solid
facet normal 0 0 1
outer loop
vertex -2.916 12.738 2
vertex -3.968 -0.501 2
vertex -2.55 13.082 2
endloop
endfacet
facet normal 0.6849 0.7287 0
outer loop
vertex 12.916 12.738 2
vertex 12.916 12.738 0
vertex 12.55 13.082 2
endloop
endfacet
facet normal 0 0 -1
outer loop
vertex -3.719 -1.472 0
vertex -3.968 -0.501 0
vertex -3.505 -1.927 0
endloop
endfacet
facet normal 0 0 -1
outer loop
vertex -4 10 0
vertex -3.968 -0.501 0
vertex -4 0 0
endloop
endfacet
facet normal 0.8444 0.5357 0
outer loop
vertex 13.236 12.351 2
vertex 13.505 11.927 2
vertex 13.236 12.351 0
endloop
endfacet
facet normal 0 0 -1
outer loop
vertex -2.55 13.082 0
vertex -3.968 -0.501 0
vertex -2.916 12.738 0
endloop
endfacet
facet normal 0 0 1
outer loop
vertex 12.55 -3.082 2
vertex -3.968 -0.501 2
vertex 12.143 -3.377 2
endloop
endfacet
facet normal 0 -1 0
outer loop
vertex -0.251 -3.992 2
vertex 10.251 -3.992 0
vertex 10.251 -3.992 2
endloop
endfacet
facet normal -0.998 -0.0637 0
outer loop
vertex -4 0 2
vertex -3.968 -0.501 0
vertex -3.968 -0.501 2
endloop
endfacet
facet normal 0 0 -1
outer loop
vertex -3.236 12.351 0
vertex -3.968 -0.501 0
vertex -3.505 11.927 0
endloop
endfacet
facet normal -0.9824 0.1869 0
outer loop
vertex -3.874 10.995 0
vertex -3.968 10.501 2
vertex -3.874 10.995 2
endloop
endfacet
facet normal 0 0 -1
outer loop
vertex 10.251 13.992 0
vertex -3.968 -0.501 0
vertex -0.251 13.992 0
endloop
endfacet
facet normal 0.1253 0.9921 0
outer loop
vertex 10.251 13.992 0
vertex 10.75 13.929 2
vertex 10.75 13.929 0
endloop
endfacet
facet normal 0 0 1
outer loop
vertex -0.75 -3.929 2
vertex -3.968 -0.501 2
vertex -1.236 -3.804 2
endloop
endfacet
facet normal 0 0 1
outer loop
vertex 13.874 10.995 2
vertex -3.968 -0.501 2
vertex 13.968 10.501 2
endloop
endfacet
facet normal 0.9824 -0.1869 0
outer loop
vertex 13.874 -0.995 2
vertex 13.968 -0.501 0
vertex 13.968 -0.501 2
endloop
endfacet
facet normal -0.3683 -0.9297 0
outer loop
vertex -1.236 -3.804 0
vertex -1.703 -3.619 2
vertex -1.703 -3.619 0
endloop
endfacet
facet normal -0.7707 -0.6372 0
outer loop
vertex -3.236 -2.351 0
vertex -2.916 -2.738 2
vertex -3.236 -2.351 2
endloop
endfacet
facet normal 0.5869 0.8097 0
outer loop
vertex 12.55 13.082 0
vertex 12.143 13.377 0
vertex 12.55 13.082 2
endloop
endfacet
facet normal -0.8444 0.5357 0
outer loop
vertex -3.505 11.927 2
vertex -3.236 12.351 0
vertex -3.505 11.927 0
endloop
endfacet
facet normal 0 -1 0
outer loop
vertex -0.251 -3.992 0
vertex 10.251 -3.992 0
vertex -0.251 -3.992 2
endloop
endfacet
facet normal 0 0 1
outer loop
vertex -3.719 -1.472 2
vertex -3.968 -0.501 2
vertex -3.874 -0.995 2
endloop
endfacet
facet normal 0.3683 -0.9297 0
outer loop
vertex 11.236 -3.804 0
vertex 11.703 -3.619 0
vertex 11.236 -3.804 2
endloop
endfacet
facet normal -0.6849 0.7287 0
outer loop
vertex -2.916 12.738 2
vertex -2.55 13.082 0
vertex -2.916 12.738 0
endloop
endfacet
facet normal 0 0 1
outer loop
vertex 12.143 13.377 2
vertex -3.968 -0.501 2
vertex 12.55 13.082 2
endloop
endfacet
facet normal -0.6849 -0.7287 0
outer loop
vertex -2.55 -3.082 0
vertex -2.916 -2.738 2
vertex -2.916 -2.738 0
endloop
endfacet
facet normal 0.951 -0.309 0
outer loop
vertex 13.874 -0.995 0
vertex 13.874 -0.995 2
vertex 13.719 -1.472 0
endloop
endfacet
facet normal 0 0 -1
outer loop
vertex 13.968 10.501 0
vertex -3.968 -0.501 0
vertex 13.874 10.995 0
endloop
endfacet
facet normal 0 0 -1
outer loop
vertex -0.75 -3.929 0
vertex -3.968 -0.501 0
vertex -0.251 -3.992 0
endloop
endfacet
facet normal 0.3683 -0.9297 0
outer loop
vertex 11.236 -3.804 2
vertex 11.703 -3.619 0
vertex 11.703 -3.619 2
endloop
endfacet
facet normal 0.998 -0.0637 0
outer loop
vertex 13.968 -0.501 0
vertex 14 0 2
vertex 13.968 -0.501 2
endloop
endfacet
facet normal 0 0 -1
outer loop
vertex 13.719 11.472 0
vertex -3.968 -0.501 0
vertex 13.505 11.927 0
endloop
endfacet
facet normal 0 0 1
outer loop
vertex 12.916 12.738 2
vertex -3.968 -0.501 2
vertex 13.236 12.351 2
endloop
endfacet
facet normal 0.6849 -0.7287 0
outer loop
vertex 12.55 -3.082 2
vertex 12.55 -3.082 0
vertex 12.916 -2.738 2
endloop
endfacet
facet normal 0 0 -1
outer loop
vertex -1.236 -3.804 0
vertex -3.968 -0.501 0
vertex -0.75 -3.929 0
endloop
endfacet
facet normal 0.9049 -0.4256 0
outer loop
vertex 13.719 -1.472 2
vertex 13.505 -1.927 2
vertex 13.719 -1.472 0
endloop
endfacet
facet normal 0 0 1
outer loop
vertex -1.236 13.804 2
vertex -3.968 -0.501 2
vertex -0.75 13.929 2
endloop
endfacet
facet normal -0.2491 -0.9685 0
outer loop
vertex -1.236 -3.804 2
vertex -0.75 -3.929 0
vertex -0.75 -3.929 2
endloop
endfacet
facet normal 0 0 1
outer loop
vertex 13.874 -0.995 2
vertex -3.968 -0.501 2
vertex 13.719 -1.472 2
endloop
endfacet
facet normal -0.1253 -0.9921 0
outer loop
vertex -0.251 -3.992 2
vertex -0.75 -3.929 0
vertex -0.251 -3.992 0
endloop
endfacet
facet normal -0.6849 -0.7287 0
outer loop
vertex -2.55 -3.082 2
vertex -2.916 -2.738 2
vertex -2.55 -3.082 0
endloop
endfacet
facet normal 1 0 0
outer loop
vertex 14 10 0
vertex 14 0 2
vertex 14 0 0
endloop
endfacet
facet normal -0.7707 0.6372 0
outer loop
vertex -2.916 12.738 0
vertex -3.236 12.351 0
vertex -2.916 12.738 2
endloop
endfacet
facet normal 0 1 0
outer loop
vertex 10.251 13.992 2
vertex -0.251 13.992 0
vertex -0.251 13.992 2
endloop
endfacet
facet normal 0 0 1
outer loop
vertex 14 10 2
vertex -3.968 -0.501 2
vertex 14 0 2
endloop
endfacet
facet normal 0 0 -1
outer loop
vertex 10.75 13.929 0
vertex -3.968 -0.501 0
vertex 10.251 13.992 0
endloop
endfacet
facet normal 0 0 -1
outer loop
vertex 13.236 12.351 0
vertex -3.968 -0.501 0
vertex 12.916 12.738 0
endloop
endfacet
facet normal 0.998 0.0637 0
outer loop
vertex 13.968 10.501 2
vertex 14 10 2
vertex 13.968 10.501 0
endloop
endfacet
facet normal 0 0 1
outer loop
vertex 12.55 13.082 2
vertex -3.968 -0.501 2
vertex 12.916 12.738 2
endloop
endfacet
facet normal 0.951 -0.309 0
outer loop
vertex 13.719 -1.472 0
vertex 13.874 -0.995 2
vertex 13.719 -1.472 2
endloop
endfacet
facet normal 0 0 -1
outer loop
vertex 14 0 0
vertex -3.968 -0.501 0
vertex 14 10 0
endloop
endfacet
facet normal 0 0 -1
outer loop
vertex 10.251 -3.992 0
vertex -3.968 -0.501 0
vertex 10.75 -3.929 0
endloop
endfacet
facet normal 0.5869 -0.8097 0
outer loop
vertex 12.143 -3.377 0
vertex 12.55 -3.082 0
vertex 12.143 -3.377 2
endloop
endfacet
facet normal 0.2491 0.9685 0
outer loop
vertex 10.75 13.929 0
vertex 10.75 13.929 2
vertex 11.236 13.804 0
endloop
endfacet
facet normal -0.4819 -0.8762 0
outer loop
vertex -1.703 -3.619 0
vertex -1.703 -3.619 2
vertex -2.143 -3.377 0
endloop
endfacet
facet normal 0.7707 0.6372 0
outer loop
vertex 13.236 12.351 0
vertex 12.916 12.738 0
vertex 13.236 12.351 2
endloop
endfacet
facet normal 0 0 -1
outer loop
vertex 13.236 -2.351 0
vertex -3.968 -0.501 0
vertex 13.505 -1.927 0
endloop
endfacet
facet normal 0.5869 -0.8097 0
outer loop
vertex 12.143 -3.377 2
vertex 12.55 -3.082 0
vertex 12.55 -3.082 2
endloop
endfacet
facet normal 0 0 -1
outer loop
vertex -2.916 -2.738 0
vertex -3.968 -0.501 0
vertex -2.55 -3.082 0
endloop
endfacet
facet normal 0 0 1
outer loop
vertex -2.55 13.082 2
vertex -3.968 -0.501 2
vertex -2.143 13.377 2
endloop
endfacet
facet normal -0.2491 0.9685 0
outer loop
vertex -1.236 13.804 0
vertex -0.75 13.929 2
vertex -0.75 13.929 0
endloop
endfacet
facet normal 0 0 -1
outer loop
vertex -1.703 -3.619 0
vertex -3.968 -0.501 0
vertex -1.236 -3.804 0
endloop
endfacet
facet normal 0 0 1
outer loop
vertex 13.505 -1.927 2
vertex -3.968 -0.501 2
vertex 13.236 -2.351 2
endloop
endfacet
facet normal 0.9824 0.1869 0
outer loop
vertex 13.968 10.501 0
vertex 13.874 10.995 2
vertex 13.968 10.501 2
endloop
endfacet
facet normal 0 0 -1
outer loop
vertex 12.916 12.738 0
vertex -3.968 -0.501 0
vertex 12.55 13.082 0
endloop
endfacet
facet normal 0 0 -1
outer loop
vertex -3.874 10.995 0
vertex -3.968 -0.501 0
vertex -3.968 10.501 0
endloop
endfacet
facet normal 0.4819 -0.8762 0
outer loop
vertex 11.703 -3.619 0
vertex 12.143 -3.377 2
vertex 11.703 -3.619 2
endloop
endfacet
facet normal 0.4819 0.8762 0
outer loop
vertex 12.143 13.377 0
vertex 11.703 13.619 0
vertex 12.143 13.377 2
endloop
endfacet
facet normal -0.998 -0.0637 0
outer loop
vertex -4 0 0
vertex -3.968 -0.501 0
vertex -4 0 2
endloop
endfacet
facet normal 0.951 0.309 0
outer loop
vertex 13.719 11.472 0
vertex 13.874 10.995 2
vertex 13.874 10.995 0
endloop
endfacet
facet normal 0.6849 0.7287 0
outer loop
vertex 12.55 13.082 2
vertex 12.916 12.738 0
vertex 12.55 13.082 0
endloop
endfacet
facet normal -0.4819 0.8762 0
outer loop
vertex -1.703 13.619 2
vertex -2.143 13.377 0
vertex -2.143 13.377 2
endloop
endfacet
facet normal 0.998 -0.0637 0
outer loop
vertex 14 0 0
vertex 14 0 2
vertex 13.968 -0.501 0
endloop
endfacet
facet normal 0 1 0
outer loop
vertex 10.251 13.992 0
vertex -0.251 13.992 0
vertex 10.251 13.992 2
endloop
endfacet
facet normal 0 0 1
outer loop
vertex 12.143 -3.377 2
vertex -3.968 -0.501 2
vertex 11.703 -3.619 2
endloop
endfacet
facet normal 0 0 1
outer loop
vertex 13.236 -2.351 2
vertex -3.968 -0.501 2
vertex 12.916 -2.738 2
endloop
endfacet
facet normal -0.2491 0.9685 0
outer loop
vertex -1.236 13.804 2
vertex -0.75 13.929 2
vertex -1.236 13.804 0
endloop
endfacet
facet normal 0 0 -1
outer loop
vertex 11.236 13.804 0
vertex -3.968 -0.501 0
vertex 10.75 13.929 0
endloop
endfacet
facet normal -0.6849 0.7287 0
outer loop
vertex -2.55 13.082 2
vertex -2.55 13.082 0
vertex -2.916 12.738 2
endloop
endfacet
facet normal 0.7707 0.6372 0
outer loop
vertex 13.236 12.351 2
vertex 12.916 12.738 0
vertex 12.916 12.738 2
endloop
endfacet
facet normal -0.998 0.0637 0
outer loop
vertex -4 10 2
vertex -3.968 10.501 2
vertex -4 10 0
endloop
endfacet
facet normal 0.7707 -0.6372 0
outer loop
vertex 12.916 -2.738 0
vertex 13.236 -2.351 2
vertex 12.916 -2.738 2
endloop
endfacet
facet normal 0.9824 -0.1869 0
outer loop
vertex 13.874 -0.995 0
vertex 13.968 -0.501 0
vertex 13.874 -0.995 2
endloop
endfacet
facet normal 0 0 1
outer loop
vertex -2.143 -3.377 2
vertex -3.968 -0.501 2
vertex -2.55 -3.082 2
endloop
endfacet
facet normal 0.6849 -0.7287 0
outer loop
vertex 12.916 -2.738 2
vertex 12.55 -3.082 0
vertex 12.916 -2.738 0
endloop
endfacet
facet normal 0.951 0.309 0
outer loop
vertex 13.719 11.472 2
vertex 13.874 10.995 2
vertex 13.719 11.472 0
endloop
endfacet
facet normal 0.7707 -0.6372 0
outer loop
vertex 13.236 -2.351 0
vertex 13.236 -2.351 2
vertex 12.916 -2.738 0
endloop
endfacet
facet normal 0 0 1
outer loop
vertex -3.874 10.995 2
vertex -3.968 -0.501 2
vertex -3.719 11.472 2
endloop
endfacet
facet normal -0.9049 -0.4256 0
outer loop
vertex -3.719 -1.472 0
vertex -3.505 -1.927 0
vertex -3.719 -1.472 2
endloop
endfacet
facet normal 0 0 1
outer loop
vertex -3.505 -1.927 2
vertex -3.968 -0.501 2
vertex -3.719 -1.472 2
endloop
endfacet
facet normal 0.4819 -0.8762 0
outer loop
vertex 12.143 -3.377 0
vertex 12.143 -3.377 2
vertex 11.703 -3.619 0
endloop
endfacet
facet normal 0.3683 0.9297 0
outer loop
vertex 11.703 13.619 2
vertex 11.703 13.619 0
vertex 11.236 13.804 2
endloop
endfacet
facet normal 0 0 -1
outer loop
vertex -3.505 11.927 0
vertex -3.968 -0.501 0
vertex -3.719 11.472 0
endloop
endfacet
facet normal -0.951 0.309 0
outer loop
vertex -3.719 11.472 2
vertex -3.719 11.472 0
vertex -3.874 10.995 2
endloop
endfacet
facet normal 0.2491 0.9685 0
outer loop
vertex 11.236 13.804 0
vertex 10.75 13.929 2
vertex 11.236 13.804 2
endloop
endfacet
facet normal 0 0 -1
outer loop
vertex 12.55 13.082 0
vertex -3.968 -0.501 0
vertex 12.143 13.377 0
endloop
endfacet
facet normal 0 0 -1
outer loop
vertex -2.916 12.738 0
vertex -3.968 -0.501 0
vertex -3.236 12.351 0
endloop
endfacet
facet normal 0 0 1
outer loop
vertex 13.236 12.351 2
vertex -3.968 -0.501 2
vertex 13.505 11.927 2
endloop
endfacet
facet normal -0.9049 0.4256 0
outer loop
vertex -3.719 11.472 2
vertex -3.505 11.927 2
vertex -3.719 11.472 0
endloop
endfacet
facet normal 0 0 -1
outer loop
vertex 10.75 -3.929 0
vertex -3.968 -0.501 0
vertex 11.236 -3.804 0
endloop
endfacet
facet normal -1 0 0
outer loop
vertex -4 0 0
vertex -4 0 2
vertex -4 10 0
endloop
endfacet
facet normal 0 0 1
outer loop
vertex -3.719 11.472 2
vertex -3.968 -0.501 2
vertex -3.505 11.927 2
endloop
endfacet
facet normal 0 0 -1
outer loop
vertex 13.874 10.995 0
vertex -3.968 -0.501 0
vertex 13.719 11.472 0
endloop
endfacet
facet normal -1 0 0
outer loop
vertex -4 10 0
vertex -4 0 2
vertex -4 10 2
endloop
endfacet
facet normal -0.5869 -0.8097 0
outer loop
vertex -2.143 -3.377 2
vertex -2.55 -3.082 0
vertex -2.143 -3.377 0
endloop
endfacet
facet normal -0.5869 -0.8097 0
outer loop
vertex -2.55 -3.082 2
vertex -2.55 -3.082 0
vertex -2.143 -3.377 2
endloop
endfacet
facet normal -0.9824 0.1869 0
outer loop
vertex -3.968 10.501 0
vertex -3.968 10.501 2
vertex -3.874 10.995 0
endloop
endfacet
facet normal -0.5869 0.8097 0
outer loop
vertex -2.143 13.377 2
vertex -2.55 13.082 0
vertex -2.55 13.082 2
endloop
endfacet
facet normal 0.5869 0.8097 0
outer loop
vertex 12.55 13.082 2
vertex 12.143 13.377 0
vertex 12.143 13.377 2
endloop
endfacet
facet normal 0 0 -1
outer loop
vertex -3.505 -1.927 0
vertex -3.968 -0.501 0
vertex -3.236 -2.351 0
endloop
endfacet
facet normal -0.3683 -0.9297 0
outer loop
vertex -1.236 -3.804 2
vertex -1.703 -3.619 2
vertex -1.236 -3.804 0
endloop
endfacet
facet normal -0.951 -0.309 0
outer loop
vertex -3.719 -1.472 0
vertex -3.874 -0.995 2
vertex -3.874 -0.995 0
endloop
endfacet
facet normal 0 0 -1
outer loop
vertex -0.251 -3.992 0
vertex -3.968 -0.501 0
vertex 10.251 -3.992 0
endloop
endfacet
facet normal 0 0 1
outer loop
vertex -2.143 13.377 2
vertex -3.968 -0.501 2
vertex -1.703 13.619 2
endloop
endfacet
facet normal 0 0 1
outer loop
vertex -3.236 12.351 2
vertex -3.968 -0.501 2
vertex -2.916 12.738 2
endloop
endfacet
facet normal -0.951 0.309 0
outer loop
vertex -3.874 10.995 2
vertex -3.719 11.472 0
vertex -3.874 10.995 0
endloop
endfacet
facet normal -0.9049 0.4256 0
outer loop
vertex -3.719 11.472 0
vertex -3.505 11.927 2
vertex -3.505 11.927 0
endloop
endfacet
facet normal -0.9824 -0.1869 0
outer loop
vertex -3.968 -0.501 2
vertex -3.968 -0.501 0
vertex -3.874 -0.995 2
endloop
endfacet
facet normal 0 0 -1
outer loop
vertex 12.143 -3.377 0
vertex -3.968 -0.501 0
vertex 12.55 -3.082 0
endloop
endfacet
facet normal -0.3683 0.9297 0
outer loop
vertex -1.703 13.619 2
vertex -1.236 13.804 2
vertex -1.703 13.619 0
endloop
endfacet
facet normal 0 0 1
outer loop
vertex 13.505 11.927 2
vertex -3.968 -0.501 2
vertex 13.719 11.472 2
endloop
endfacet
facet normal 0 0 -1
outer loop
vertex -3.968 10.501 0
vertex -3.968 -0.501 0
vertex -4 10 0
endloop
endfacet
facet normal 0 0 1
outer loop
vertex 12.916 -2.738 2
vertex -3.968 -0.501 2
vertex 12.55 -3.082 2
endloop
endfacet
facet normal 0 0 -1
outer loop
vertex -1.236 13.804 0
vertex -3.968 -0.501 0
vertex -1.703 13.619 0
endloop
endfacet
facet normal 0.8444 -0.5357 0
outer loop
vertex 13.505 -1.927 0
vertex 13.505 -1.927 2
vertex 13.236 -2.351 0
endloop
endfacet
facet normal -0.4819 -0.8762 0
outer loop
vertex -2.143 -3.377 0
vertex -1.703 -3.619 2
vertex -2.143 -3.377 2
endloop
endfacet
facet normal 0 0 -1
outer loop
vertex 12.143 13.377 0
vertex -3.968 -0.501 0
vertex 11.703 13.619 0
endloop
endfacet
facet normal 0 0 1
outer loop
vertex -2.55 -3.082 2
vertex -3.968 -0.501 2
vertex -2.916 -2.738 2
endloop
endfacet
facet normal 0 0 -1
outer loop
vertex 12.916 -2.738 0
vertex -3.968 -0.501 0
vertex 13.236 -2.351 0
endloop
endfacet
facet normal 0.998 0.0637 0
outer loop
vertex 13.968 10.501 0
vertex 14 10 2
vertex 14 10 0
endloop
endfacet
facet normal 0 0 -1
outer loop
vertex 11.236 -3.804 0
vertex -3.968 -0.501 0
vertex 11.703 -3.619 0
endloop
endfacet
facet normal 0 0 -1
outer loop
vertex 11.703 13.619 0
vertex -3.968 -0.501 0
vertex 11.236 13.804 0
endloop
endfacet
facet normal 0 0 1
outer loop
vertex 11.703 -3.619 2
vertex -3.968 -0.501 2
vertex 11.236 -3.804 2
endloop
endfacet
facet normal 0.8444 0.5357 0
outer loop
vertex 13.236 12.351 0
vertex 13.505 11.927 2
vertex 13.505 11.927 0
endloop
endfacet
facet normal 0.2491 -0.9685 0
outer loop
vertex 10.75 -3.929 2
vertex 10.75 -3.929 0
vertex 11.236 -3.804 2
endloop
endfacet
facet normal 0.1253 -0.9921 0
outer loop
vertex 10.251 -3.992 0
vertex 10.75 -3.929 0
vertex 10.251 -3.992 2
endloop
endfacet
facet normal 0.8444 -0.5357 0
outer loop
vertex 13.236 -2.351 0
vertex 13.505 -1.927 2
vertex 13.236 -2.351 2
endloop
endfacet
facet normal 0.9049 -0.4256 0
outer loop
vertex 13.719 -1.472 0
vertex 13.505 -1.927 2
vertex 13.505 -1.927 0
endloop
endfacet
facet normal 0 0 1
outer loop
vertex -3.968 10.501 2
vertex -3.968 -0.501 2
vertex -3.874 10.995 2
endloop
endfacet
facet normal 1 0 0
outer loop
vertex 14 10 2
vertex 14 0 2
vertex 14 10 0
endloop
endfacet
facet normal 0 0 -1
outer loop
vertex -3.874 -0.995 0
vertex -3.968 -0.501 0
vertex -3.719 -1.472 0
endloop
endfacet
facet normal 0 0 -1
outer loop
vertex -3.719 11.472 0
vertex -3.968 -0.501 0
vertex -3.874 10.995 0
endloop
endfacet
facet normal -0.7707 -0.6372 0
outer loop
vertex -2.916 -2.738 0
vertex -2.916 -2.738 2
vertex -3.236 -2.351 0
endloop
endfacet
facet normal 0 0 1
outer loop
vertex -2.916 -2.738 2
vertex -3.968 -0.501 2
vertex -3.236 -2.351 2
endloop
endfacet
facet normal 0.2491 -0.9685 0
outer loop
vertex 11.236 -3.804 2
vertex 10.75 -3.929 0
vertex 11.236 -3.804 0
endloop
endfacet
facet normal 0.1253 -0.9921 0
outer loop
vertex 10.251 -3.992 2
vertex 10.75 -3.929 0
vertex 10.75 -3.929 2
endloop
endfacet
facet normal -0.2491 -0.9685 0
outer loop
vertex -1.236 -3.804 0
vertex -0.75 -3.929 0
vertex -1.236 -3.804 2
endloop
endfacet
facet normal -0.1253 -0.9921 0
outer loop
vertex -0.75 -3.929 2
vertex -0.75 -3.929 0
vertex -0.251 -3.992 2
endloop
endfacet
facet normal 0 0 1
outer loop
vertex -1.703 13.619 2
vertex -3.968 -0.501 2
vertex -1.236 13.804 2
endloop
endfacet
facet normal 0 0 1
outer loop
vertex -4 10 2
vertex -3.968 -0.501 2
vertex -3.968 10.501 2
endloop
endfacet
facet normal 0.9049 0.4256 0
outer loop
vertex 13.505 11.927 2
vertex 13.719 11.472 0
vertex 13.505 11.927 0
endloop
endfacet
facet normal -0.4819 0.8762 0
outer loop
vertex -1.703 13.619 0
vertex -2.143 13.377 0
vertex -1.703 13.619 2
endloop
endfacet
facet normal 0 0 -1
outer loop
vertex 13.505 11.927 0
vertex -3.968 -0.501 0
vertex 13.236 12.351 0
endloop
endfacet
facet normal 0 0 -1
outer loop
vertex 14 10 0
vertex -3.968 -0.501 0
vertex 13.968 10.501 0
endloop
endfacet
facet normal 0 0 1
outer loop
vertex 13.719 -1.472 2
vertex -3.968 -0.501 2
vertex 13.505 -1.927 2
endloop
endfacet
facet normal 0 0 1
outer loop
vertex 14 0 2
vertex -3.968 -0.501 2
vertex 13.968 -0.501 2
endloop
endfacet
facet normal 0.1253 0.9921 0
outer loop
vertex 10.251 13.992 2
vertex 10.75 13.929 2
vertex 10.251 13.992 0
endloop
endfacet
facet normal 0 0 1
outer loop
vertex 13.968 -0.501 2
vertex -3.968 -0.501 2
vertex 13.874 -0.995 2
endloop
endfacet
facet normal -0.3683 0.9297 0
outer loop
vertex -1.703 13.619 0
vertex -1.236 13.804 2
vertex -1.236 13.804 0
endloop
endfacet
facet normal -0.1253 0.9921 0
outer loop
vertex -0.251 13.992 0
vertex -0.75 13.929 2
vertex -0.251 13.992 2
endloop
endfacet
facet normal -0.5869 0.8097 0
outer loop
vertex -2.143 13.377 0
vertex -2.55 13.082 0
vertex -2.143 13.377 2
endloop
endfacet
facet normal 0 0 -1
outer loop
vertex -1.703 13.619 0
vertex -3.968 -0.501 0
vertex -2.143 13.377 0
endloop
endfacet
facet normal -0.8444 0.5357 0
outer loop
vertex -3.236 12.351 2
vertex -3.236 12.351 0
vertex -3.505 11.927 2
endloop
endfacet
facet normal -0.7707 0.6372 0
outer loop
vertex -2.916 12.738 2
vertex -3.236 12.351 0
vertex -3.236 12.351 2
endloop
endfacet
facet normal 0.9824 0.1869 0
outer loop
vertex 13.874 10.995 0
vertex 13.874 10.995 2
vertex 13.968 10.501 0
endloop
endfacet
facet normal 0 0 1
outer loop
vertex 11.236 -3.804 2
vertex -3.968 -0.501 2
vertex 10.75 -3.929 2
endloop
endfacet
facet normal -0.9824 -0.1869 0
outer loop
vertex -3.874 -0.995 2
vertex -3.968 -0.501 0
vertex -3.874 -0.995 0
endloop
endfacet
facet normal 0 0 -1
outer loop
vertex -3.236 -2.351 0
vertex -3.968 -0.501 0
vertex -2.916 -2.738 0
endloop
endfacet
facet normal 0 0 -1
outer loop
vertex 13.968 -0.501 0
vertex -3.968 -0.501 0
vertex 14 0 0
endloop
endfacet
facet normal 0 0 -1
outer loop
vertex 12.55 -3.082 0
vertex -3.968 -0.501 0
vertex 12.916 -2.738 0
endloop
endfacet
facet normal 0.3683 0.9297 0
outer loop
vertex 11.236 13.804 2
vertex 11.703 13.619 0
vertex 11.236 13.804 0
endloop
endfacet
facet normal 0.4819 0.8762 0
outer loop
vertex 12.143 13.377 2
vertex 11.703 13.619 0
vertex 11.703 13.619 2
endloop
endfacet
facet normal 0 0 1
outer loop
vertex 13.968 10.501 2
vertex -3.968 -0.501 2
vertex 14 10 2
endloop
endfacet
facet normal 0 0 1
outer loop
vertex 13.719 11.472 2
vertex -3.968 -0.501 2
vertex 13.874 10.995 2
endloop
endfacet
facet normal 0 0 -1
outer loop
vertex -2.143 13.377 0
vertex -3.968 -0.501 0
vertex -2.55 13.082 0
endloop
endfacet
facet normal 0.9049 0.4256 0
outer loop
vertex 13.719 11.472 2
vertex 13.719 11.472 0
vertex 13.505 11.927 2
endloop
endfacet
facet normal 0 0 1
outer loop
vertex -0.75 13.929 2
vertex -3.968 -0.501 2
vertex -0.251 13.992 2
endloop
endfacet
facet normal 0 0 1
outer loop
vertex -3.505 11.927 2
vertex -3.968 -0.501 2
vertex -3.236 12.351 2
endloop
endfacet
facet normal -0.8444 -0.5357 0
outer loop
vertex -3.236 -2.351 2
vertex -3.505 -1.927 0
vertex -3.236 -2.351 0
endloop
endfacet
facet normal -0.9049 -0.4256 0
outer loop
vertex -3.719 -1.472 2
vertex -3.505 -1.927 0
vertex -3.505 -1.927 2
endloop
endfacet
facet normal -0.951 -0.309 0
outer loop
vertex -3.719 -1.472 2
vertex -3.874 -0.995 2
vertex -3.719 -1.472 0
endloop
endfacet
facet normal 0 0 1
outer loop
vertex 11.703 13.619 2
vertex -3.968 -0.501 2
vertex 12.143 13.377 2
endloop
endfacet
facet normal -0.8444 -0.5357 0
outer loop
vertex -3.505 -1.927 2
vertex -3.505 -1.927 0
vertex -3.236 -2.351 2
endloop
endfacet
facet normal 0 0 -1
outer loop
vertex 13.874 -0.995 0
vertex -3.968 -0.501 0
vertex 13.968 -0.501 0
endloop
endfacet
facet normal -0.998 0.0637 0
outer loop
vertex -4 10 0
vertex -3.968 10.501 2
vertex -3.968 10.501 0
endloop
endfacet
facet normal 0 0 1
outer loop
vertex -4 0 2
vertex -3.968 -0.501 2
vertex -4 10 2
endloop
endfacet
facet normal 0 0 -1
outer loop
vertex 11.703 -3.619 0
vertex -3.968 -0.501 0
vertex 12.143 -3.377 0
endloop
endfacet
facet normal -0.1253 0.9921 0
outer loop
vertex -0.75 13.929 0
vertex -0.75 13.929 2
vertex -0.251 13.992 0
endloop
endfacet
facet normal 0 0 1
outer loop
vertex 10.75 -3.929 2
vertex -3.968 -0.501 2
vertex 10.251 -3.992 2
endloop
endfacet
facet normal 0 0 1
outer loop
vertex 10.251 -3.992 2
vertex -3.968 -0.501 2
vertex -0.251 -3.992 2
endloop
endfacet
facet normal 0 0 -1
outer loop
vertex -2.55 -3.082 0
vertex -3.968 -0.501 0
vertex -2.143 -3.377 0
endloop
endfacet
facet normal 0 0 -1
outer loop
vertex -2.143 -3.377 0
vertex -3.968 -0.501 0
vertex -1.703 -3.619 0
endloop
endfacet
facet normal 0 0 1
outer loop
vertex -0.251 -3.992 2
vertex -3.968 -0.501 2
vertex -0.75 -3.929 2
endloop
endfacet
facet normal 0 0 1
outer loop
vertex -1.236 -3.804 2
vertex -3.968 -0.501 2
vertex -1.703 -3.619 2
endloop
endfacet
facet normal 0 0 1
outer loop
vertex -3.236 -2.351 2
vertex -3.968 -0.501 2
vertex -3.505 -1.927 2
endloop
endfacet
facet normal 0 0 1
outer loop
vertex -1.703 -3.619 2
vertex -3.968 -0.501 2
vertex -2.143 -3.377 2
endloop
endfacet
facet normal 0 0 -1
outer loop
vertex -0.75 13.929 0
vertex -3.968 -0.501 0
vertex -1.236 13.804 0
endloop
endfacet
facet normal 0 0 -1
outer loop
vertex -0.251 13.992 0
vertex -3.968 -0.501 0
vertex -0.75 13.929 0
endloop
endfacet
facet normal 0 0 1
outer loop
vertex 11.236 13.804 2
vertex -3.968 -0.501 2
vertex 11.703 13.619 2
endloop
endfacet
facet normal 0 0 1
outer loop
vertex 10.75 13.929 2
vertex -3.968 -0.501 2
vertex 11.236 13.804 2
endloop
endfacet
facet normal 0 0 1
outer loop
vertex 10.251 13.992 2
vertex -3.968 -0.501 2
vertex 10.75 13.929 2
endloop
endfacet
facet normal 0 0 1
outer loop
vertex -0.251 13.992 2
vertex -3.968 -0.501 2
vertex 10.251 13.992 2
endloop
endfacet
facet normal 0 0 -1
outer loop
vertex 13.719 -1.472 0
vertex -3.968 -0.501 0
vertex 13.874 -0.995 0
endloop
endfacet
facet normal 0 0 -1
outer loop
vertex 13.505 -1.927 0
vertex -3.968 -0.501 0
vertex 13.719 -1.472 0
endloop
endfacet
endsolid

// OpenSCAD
$fn=50;
// https://www.youtube.com/watch?v=3qMNuoTHNHs

!color("Yellow") minkowski() {
  cube([10,10,1]);
  cylinder(r=4,h=1);
}


translate([50,0,0]) {
     color("Magenta") minkowski() {
       cube([10,10,10]);
       sphere(r=1);
     }    
}


translate([-50,0,0]) {
    color("Blue") hull() {
        sphere(r=4);
        translate([20,20,0])
            sphere(r=10);
        translate([20,20,20])
            sphere(r=4);
        translate([20,30,40])
            sphere(r=4);
        translate([-20,30,40])
            sphere(r=4);
   }    
}
